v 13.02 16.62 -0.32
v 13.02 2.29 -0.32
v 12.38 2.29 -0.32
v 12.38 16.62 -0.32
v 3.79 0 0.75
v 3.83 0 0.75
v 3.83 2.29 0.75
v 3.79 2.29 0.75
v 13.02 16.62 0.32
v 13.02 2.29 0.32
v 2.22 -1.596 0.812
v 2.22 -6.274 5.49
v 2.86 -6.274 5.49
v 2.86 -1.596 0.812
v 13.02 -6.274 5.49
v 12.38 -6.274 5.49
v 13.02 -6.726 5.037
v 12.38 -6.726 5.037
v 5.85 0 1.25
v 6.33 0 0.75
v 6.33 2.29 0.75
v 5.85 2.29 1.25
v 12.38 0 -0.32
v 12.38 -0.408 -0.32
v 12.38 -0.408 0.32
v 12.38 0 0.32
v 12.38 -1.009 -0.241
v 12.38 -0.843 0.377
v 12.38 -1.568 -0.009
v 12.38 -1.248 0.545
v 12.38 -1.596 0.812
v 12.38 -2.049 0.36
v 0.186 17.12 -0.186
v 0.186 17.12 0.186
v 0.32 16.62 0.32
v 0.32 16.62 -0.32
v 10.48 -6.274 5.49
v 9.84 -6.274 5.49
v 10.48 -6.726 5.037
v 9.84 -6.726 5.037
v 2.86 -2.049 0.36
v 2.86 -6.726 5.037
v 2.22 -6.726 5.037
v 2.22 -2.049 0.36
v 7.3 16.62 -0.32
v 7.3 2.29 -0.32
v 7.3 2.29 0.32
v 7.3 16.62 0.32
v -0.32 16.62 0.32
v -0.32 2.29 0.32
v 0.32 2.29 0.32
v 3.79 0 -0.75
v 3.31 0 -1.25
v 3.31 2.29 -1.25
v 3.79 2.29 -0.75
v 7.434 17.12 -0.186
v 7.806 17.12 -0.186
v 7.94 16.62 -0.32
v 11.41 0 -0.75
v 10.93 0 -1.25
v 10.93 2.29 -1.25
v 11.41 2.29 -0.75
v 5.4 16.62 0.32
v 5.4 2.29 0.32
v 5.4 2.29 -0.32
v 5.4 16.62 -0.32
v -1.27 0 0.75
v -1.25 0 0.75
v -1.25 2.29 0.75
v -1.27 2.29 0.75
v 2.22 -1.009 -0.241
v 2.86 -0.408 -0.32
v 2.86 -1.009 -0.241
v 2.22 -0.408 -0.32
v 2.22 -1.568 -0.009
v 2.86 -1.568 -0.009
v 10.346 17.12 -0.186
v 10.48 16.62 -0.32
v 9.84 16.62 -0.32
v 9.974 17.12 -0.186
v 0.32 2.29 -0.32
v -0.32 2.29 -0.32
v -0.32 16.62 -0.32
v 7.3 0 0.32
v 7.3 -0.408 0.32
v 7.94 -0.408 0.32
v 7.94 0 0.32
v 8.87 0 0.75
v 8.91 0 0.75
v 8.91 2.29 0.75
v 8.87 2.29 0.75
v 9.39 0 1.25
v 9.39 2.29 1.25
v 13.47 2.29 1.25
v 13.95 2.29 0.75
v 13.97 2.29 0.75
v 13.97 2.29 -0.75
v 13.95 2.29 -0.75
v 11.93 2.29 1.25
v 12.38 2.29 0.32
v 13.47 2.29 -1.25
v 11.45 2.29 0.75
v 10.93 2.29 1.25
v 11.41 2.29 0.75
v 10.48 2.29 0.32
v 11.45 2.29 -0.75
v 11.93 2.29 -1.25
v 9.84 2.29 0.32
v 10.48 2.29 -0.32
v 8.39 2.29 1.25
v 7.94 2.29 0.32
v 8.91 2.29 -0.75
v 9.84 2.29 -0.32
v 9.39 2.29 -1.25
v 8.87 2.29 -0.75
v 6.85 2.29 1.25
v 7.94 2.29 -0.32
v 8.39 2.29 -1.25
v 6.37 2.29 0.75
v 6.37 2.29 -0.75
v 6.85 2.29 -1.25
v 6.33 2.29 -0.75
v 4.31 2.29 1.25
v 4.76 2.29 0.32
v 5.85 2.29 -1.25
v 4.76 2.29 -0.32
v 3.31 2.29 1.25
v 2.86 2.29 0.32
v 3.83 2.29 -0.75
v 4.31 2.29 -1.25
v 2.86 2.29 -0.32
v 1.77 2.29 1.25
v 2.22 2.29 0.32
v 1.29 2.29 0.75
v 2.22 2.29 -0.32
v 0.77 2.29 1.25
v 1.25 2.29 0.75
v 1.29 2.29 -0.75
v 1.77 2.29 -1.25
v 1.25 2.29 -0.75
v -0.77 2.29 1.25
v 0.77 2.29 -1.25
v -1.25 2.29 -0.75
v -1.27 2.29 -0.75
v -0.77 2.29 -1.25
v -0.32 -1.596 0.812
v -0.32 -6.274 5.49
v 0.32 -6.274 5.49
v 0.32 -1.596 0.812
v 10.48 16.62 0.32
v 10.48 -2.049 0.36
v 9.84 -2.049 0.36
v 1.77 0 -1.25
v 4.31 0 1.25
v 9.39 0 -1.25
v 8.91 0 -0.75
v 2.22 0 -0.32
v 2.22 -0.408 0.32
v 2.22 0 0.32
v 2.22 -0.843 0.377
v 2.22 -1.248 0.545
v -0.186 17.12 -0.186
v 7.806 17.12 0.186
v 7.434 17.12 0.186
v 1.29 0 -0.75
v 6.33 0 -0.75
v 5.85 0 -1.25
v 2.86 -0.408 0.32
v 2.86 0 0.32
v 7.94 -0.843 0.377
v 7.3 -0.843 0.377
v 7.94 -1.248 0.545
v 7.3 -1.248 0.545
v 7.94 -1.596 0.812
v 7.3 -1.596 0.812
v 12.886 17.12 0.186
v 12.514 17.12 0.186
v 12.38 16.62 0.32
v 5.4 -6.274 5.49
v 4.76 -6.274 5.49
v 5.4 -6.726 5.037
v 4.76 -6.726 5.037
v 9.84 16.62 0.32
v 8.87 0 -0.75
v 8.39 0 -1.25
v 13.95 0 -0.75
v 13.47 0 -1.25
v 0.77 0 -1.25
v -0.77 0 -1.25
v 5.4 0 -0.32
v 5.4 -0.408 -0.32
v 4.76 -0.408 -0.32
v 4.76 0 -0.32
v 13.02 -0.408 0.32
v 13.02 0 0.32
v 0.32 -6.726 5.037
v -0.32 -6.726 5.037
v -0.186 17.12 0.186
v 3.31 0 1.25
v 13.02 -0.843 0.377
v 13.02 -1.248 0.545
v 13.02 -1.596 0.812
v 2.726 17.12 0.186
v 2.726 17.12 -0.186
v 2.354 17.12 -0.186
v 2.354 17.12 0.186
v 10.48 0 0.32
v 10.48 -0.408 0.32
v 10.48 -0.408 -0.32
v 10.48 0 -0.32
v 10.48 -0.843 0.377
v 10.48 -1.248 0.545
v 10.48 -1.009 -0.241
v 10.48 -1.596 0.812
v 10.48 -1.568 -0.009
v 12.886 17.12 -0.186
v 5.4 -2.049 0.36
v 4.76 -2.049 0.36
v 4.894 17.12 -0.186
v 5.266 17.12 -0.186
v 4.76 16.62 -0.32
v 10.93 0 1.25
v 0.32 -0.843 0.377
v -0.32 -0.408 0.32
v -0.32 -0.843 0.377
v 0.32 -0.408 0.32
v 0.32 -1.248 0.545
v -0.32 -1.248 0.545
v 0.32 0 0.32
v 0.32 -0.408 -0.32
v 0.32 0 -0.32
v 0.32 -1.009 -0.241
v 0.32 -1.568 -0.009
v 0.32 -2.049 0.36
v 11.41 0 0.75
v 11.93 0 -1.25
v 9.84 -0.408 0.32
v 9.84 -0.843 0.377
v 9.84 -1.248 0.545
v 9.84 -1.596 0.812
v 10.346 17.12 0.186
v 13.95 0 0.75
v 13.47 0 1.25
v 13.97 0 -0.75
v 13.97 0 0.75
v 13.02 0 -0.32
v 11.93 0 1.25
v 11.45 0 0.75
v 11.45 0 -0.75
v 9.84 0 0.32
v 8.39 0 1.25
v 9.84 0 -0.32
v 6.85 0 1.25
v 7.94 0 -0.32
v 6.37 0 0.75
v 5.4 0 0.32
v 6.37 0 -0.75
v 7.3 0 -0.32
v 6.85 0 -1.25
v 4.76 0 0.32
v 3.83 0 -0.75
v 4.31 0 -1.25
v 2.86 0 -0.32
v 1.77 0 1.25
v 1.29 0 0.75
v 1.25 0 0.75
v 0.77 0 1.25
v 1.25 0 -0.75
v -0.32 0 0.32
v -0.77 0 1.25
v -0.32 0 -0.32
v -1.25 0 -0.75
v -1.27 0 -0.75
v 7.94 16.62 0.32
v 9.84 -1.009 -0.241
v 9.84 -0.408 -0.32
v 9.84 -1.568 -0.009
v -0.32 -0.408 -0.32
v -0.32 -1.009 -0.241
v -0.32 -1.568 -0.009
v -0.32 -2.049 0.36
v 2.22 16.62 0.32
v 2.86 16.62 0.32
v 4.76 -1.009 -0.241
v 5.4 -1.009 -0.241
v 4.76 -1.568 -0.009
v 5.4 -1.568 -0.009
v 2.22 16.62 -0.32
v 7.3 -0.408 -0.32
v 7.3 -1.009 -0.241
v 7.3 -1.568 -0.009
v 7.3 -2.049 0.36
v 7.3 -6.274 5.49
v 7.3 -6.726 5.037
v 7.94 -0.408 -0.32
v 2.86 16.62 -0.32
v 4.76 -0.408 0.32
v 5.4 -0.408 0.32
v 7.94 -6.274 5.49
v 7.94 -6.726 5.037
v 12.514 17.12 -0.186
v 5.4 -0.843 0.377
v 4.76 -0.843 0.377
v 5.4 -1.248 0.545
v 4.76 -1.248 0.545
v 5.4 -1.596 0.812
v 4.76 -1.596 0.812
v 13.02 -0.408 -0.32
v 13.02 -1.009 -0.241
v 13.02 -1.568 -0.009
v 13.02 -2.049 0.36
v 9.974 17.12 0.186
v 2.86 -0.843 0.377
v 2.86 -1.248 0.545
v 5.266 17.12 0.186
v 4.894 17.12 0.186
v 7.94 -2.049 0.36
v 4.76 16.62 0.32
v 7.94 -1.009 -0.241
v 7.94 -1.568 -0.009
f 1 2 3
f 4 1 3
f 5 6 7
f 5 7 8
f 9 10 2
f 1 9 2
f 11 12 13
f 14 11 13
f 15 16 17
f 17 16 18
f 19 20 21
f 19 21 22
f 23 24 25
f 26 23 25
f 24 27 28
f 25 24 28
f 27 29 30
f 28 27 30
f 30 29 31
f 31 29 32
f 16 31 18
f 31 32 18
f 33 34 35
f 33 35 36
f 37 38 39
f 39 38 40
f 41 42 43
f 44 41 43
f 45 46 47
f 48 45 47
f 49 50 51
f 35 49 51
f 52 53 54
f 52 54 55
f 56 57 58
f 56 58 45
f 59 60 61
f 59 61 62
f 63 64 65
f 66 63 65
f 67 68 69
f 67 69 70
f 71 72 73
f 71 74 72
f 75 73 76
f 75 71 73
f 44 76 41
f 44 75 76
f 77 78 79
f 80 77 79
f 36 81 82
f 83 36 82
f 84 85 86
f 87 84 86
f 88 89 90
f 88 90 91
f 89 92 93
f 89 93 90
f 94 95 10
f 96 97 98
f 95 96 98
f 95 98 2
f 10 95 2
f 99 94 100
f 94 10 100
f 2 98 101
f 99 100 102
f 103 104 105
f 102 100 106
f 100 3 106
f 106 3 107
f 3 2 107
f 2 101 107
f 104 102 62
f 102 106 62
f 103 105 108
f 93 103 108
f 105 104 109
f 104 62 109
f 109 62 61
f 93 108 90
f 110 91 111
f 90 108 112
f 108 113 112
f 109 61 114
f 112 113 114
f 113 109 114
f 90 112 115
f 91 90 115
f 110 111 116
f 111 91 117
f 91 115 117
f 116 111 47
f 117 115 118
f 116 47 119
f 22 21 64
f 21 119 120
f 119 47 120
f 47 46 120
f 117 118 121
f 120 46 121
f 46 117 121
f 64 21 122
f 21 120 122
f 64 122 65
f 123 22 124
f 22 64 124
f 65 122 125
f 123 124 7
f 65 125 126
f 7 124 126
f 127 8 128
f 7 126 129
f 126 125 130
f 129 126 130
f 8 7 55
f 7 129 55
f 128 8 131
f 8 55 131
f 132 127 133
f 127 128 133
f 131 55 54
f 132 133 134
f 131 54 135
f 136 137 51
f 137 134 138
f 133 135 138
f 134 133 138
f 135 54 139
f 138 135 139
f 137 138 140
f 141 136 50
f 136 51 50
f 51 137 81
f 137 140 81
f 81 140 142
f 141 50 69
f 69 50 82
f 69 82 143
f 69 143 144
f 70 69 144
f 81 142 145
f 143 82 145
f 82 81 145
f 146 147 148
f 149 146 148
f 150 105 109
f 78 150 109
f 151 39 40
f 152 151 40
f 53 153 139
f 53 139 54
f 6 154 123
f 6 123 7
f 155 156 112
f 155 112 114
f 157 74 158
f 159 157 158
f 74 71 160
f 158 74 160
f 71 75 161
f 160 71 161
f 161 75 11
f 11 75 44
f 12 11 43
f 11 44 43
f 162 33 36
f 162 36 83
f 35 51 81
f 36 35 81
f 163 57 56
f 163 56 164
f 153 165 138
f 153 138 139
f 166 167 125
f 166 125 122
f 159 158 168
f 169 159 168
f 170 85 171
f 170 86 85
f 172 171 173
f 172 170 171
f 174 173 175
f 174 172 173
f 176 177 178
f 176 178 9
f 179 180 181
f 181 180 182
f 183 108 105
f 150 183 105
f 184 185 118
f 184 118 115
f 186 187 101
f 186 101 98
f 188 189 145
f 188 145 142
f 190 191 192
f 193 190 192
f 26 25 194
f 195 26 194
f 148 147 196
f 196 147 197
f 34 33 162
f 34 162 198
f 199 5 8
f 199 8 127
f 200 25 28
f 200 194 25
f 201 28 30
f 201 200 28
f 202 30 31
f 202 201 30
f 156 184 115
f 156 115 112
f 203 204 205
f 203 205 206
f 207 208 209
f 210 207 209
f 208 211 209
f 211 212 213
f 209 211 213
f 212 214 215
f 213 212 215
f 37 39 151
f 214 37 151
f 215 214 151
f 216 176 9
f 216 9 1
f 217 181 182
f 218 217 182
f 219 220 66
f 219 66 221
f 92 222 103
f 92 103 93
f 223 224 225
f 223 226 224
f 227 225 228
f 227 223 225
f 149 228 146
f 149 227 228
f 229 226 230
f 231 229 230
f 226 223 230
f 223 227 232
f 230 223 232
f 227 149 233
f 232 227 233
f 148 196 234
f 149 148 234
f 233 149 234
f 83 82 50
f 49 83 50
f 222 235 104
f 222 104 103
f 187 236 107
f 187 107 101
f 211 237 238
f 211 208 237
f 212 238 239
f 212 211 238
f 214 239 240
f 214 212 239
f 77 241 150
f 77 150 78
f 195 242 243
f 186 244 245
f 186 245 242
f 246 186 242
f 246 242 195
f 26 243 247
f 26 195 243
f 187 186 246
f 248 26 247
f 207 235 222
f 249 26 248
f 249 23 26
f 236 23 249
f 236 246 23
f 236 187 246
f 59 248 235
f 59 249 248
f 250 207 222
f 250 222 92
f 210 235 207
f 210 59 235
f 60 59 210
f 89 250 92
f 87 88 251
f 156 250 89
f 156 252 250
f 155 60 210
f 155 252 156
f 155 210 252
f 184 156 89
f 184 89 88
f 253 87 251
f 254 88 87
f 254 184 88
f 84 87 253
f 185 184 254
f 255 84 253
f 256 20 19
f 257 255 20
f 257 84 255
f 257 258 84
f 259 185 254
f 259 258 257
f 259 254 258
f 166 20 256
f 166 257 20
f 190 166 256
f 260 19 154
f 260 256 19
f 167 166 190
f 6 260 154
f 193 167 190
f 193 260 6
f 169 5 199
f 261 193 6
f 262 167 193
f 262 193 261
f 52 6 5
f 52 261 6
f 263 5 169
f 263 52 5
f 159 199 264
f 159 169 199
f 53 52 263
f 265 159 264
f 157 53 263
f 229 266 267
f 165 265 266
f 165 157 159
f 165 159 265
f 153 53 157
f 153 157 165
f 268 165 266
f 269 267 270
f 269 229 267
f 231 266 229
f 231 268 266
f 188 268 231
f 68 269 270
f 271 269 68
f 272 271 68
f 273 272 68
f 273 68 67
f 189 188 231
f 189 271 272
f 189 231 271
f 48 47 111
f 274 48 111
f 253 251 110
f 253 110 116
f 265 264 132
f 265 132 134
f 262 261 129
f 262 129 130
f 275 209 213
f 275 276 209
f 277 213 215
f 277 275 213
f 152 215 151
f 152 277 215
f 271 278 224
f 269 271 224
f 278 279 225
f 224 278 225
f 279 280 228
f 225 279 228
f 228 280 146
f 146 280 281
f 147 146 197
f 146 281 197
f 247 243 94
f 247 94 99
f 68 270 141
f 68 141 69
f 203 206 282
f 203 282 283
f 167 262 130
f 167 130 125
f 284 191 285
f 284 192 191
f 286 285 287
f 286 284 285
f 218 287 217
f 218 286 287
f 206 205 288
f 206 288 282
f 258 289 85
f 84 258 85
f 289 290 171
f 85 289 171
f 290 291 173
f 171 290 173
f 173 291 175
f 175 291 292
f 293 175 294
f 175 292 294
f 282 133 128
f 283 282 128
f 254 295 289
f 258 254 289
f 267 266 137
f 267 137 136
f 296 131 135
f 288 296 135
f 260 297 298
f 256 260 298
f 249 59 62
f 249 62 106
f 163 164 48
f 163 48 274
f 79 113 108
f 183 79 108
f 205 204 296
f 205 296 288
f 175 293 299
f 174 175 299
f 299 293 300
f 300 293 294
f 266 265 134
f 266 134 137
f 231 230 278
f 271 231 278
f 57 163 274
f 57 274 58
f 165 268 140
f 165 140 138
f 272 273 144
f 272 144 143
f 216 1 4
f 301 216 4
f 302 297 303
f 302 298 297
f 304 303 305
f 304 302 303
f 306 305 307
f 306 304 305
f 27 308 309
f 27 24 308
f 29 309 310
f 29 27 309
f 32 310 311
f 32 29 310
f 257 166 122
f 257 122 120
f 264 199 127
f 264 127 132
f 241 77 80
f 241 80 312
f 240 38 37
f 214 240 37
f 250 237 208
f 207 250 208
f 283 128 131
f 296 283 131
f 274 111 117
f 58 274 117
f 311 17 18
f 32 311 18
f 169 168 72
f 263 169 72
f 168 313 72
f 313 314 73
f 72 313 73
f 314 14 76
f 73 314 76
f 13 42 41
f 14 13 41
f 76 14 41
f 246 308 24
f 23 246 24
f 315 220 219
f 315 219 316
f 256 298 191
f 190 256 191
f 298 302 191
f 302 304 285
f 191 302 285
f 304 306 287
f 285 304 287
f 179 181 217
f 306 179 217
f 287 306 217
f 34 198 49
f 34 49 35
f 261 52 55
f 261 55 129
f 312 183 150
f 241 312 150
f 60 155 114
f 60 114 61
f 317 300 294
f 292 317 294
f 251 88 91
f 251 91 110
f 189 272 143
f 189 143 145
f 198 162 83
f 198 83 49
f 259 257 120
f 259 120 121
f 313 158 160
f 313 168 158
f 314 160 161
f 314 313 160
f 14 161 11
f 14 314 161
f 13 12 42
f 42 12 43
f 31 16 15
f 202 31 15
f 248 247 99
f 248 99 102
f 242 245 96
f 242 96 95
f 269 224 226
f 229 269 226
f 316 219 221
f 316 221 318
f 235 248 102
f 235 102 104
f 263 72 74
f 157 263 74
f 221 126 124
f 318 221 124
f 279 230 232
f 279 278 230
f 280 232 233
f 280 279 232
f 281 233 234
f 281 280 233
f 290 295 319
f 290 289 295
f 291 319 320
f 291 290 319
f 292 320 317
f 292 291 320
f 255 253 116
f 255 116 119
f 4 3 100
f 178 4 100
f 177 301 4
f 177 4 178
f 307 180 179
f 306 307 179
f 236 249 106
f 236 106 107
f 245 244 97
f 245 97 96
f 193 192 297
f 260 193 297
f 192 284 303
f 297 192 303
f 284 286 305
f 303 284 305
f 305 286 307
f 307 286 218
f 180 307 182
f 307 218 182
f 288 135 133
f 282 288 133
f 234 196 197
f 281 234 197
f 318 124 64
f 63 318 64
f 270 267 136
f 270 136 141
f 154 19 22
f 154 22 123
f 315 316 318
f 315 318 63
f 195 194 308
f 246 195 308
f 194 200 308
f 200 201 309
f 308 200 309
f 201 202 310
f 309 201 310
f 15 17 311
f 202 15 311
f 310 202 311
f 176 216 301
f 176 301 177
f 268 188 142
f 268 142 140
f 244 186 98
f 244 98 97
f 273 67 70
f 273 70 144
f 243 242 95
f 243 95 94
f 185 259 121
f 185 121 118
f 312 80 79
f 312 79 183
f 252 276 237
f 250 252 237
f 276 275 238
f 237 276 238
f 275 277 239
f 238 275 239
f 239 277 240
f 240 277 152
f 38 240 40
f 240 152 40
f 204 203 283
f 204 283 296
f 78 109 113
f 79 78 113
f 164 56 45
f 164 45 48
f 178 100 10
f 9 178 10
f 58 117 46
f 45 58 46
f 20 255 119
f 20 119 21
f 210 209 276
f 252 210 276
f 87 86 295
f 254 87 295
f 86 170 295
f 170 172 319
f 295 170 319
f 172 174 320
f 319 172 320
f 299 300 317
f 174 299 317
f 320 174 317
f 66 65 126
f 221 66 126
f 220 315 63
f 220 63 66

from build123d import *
from OCP.BRepFilletAPI import BRepFilletAPI_MakeChamfer

# Parameters (mm, degrees)
BOSS_EXTRUDE1_DEPTH         = 2.29
SKETCH3_W                   = 0.64
SKETCH3_H                   = 0.64
CHAMFER3_SIZE               = 0.5
CHAMFER3_SIZE2              = 0.133974596
LPATTERN1_COUNT             = 6
LPATTERN1_PITCH             = 2.54
CHAMFER3_OF_LPATTERN1_SIZE  = 0.5
CHAMFER3_OF_LPATTERN1_SIZE2 = 0.133974596


with BuildPart() as part:
    # Sketch1 → Boss-Extrude1 (new body)
    with BuildSketch(Plane(origin=(0, 0, 0), x_dir=(1, 0, 0), z_dir=(0, 1, 0))):
        Polygon((-0.77, 1.25), (0.77, 1.25), (1.25, 0.75), (1.27, 0.75), (1.27, -0.75), (1.25, -0.75), (0.77, -1.25), (-0.77, -1.25), (-1.25, -0.75), (-1.27, -0.75), (-1.27, 0.75), (-1.25, 0.75), align=None)
    boss_extrude1 = extrude(amount=BOSS_EXTRUDE1_DEPTH)

    # Sweep1: sweep along a path in Sketch2
    with BuildLine(Plane(origin=(0, 0, 0), x_dir=(0, 0, -1), z_dir=(1, 0, 0))) as sweep1_path:
        Line((0, 17.12), (0, -0.408142235))
        ThreePointArc((0, -0.408142235), (-0.152240935, -1.1735091), (-0.585786438, -1.822355798))
        Line((-0.585786438, -1.822355798), (-5.26343064, -6.5))
    # Sketch3 → Sweep1 (sweep)
    with BuildSketch(Plane(origin=(0, 17.12, 0), x_dir=(1, 0, 0), z_dir=(0, 1, 0))):
        Rectangle(SKETCH3_W, SKETCH3_H)
    sweep1 = sweep(path=sweep1_path.line)

    # Chamfer3: one chamfer whose edges measure the first distance from different faces: ONE call of the kernel's chamfer builder (chamfer() names one face for all edges)
    chamfer3_edges_1 = [part.edges().sort_by_distance(p)[0] for p in [
        (0.32, 17.12, 0),
    ]]
    chamfer3_side_1 = [part.faces().sort_by_distance(p)[0] for p in [
        (0.32, 9.705, 0),
    ]]
    chamfer3_edges_2 = [part.edges().sort_by_distance(p)[0] for p in [
        (0, 17.12, -0.32),
    ]]
    chamfer3_side_2 = [part.faces().sort_by_distance(p)[0] for p in [
        (0, 9.705, -0.32),
    ]]
    chamfer3_edges_3 = [part.edges().sort_by_distance(p)[0] for p in [
        (-0.32, 17.12, 0),
    ]]
    chamfer3_side_3 = [part.faces().sort_by_distance(p)[0] for p in [
        (-0.32, 9.705, 0),
    ]]
    chamfer3_edges_4 = [part.edges().sort_by_distance(p)[0] for p in [
        (0, 17.12, 0.32),
    ]]
    chamfer3_side_4 = [part.faces().sort_by_distance(p)[0] for p in [
        (0, 9.705, 0.32),
    ]]
    chamfer3 = BRepFilletAPI_MakeChamfer(part.part.solid().wrapped)
    for e in chamfer3_edges_1:
        chamfer3.Add(CHAMFER3_SIZE, CHAMFER3_SIZE2, e.wrapped, chamfer3_side_1[0].wrapped)  # the first distance lies on this face
    for e in chamfer3_edges_2:
        chamfer3.Add(CHAMFER3_SIZE, CHAMFER3_SIZE2, e.wrapped, chamfer3_side_2[0].wrapped)  # the first distance lies on this face
    for e in chamfer3_edges_3:
        chamfer3.Add(CHAMFER3_SIZE, CHAMFER3_SIZE2, e.wrapped, chamfer3_side_3[0].wrapped)  # the first distance lies on this face
    for e in chamfer3_edges_4:
        chamfer3.Add(CHAMFER3_SIZE, CHAMFER3_SIZE2, e.wrapped, chamfer3_side_4[0].wrapped)  # the first distance lies on this face
    add(Compound.cast(chamfer3.Shape()), mode=Mode.REPLACE)

    # LPattern1: Boss-Extrude1, Sweep1 ×6
    with Locations(*[(i * LPATTERN1_PITCH, 0, 0) for i in range(1, LPATTERN1_COUNT)]):
        add(boss_extrude1)
        add(sweep1)

    # Chamfer3 of LPattern1: one chamfer whose edges measure the first distance from different faces: ONE call of the kernel's chamfer builder (chamfer() names one face for all edges)
    chamfer3_of_lpattern1_edges_1 = [part.edges().sort_by_distance(p)[0] for p in [
        (2.86, 17.12, 0),
    ]]
    chamfer3_of_lpattern1_side_1 = [part.faces().sort_by_distance(p)[0] for p in [
        (2.86, 9.705, 0),
    ]]
    chamfer3_of_lpattern1_edges_2 = [part.edges().sort_by_distance(p)[0] for p in [
        (2.54, 17.12, -0.32),
    ]]
    chamfer3_of_lpattern1_side_2 = [part.faces().sort_by_distance(p)[0] for p in [
        (2.54, 9.705, -0.32),
    ]]
    chamfer3_of_lpattern1_edges_3 = [part.edges().sort_by_distance(p)[0] for p in [
        (2.22, 17.12, 0),
    ]]
    chamfer3_of_lpattern1_side_3 = [part.faces().sort_by_distance(p)[0] for p in [
        (2.22, 9.705, 0),
    ]]
    chamfer3_of_lpattern1_edges_4 = [part.edges().sort_by_distance(p)[0] for p in [
        (2.54, 17.12, 0.32),
    ]]
    chamfer3_of_lpattern1_side_4 = [part.faces().sort_by_distance(p)[0] for p in [
        (2.54, 9.705, 0.32),
    ]]
    chamfer3_of_lpattern1_edges_5 = [part.edges().sort_by_distance(p)[0] for p in [
        (5.4, 17.12, 0),
    ]]
    chamfer3_of_lpattern1_side_5 = [part.faces().sort_by_distance(p)[0] for p in [
        (5.4, 9.705, 0),
    ]]
    chamfer3_of_lpattern1_edges_6 = [part.edges().sort_by_distance(p)[0] for p in [
        (5.08, 17.12, -0.32),
    ]]
    chamfer3_of_lpattern1_side_6 = [part.faces().sort_by_distance(p)[0] for p in [
        (5.08, 9.705, -0.32),
    ]]
    chamfer3_of_lpattern1_edges_7 = [part.edges().sort_by_distance(p)[0] for p in [
        (4.76, 17.12, 0),
    ]]
    chamfer3_of_lpattern1_side_7 = [part.faces().sort_by_distance(p)[0] for p in [
        (4.76, 9.705, 0),
    ]]
    chamfer3_of_lpattern1_edges_8 = [part.edges().sort_by_distance(p)[0] for p in [
        (5.08, 17.12, 0.32),
    ]]
    chamfer3_of_lpattern1_side_8 = [part.faces().sort_by_distance(p)[0] for p in [
        (5.08, 9.705, 0.32),
    ]]
    chamfer3_of_lpattern1_edges_9 = [part.edges().sort_by_distance(p)[0] for p in [
        (7.94, 17.12, 0),
    ]]
    chamfer3_of_lpattern1_side_9 = [part.faces().sort_by_distance(p)[0] for p in [
        (7.94, 9.705, 0),
    ]]
    chamfer3_of_lpattern1_edges_10 = [part.edges().sort_by_distance(p)[0] for p in [
        (7.62, 17.12, -0.32),
    ]]
    chamfer3_of_lpattern1_side_10 = [part.faces().sort_by_distance(p)[0] for p in [
        (7.62, 9.705, -0.32),
    ]]
    chamfer3_of_lpattern1_edges_11 = [part.edges().sort_by_distance(p)[0] for p in [
        (7.3, 17.12, 0),
    ]]
    chamfer3_of_lpattern1_side_11 = [part.faces().sort_by_distance(p)[0] for p in [
        (7.3, 9.705, 0),
    ]]
    chamfer3_of_lpattern1_edges_12 = [part.edges().sort_by_distance(p)[0] for p in [
        (7.62, 17.12, 0.32),
    ]]
    chamfer3_of_lpattern1_side_12 = [part.faces().sort_by_distance(p)[0] for p in [
        (7.62, 9.705, 0.32),
    ]]
    chamfer3_of_lpattern1_edges_13 = [part.edges().sort_by_distance(p)[0] for p in [
        (10.48, 17.12, 0),
    ]]
    chamfer3_of_lpattern1_side_13 = [part.faces().sort_by_distance(p)[0] for p in [
        (10.48, 9.705, 0),
    ]]
    chamfer3_of_lpattern1_edges_14 = [part.edges().sort_by_distance(p)[0] for p in [
        (10.16, 17.12, -0.32),
    ]]
    chamfer3_of_lpattern1_side_14 = [part.faces().sort_by_distance(p)[0] for p in [
        (10.16, 9.705, -0.32),
    ]]
    chamfer3_of_lpattern1_edges_15 = [part.edges().sort_by_distance(p)[0] for p in [
        (9.84, 17.12, 0),
    ]]
    chamfer3_of_lpattern1_side_15 = [part.faces().sort_by_distance(p)[0] for p in [
        (9.84, 9.705, 0),
    ]]
    chamfer3_of_lpattern1_edges_16 = [part.edges().sort_by_distance(p)[0] for p in [
        (10.16, 17.12, 0.32),
    ]]
    chamfer3_of_lpattern1_side_16 = [part.faces().sort_by_distance(p)[0] for p in [
        (10.16, 9.705, 0.32),
    ]]
    chamfer3_of_lpattern1_edges_17 = [part.edges().sort_by_distance(p)[0] for p in [
        (13.02, 17.12, 0),
    ]]
    chamfer3_of_lpattern1_side_17 = [part.faces().sort_by_distance(p)[0] for p in [
        (13.02, 9.705, 0),
    ]]
    chamfer3_of_lpattern1_edges_18 = [part.edges().sort_by_distance(p)[0] for p in [
        (12.7, 17.12, -0.32),
    ]]
    chamfer3_of_lpattern1_side_18 = [part.faces().sort_by_distance(p)[0] for p in [
        (12.7, 9.705, -0.32),
    ]]
    chamfer3_of_lpattern1_edges_19 = [part.edges().sort_by_distance(p)[0] for p in [
        (12.38, 17.12, 0),
    ]]
    chamfer3_of_lpattern1_side_19 = [part.faces().sort_by_distance(p)[0] for p in [
        (12.38, 9.705, 0),
    ]]
    chamfer3_of_lpattern1_edges_20 = [part.edges().sort_by_distance(p)[0] for p in [
        (12.7, 17.12, 0.32),
    ]]
    chamfer3_of_lpattern1_side_20 = [part.faces().sort_by_distance(p)[0] for p in [
        (12.7, 9.705, 0.32),
    ]]
    chamfer3_of_lpattern1 = BRepFilletAPI_MakeChamfer(part.part.solid().wrapped)
    for e in chamfer3_of_lpattern1_edges_1:
        chamfer3_of_lpattern1.Add(CHAMFER3_OF_LPATTERN1_SIZE, CHAMFER3_OF_LPATTERN1_SIZE2, e.wrapped, chamfer3_of_lpattern1_side_1[0].wrapped)  # the first distance lies on this face
    for e in chamfer3_of_lpattern1_edges_2:
        chamfer3_of_lpattern1.Add(CHAMFER3_OF_LPATTERN1_SIZE, CHAMFER3_OF_LPATTERN1_SIZE2, e.wrapped, chamfer3_of_lpattern1_side_2[0].wrapped)  # the first distance lies on this face
    for e in chamfer3_of_lpattern1_edges_3:
        chamfer3_of_lpattern1.Add(CHAMFER3_OF_LPATTERN1_SIZE, CHAMFER3_OF_LPATTERN1_SIZE2, e.wrapped, chamfer3_of_lpattern1_side_3[0].wrapped)  # the first distance lies on this face
    for e in chamfer3_of_lpattern1_edges_4:
        chamfer3_of_lpattern1.Add(CHAMFER3_OF_LPATTERN1_SIZE, CHAMFER3_OF_LPATTERN1_SIZE2, e.wrapped, chamfer3_of_lpattern1_side_4[0].wrapped)  # the first distance lies on this face
    for e in chamfer3_of_lpattern1_edges_5:
        chamfer3_of_lpattern1.Add(CHAMFER3_OF_LPATTERN1_SIZE, CHAMFER3_OF_LPATTERN1_SIZE2, e.wrapped, chamfer3_of_lpattern1_side_5[0].wrapped)  # the first distance lies on this face
    for e in chamfer3_of_lpattern1_edges_6:
        chamfer3_of_lpattern1.Add(CHAMFER3_OF_LPATTERN1_SIZE, CHAMFER3_OF_LPATTERN1_SIZE2, e.wrapped, chamfer3_of_lpattern1_side_6[0].wrapped)  # the first distance lies on this face
    for e in chamfer3_of_lpattern1_edges_7:
        chamfer3_of_lpattern1.Add(CHAMFER3_OF_LPATTERN1_SIZE, CHAMFER3_OF_LPATTERN1_SIZE2, e.wrapped, chamfer3_of_lpattern1_side_7[0].wrapped)  # the first distance lies on this face
    for e in chamfer3_of_lpattern1_edges_8:
        chamfer3_of_lpattern1.Add(CHAMFER3_OF_LPATTERN1_SIZE, CHAMFER3_OF_LPATTERN1_SIZE2, e.wrapped, chamfer3_of_lpattern1_side_8[0].wrapped)  # the first distance lies on this face
    for e in chamfer3_of_lpattern1_edges_9:
        chamfer3_of_lpattern1.Add(CHAMFER3_OF_LPATTERN1_SIZE, CHAMFER3_OF_LPATTERN1_SIZE2, e.wrapped, chamfer3_of_lpattern1_side_9[0].wrapped)  # the first distance lies on this face
    for e in chamfer3_of_lpattern1_edges_10:
        chamfer3_of_lpattern1.Add(CHAMFER3_OF_LPATTERN1_SIZE, CHAMFER3_OF_LPATTERN1_SIZE2, e.wrapped, chamfer3_of_lpattern1_side_10[0].wrapped)  # the first distance lies on this face
    for e in chamfer3_of_lpattern1_edges_11:
        chamfer3_of_lpattern1.Add(CHAMFER3_OF_LPATTERN1_SIZE, CHAMFER3_OF_LPATTERN1_SIZE2, e.wrapped, chamfer3_of_lpattern1_side_11[0].wrapped)  # the first distance lies on this face
    for e in chamfer3_of_lpattern1_edges_12:
        chamfer3_of_lpattern1.Add(CHAMFER3_OF_LPATTERN1_SIZE, CHAMFER3_OF_LPATTERN1_SIZE2, e.wrapped, chamfer3_of_lpattern1_side_12[0].wrapped)  # the first distance lies on this face
    for e in chamfer3_of_lpattern1_edges_13:
        chamfer3_of_lpattern1.Add(CHAMFER3_OF_LPATTERN1_SIZE, CHAMFER3_OF_LPATTERN1_SIZE2, e.wrapped, chamfer3_of_lpattern1_side_13[0].wrapped)  # the first distance lies on this face
    for e in chamfer3_of_lpattern1_edges_14:
        chamfer3_of_lpattern1.Add(CHAMFER3_OF_LPATTERN1_SIZE, CHAMFER3_OF_LPATTERN1_SIZE2, e.wrapped, chamfer3_of_lpattern1_side_14[0].wrapped)  # the first distance lies on this face
    for e in chamfer3_of_lpattern1_edges_15:
        chamfer3_of_lpattern1.Add(CHAMFER3_OF_LPATTERN1_SIZE, CHAMFER3_OF_LPATTERN1_SIZE2, e.wrapped, chamfer3_of_lpattern1_side_15[0].wrapped)  # the first distance lies on this face
    for e in chamfer3_of_lpattern1_edges_16:
        chamfer3_of_lpattern1.Add(CHAMFER3_OF_LPATTERN1_SIZE, CHAMFER3_OF_LPATTERN1_SIZE2, e.wrapped, chamfer3_of_lpattern1_side_16[0].wrapped)  # the first distance lies on this face
    for e in chamfer3_of_lpattern1_edges_17:
        chamfer3_of_lpattern1.Add(CHAMFER3_OF_LPATTERN1_SIZE, CHAMFER3_OF_LPATTERN1_SIZE2, e.wrapped, chamfer3_of_lpattern1_side_17[0].wrapped)  # the first distance lies on this face
    for e in chamfer3_of_lpattern1_edges_18:
        chamfer3_of_lpattern1.Add(CHAMFER3_OF_LPATTERN1_SIZE, CHAMFER3_OF_LPATTERN1_SIZE2, e.wrapped, chamfer3_of_lpattern1_side_18[0].wrapped)  # the first distance lies on this face
    for e in chamfer3_of_lpattern1_edges_19:
        chamfer3_of_lpattern1.Add(CHAMFER3_OF_LPATTERN1_SIZE, CHAMFER3_OF_LPATTERN1_SIZE2, e.wrapped, chamfer3_of_lpattern1_side_19[0].wrapped)  # the first distance lies on this face
    for e in chamfer3_of_lpattern1_edges_20:
        chamfer3_of_lpattern1.Add(CHAMFER3_OF_LPATTERN1_SIZE, CHAMFER3_OF_LPATTERN1_SIZE2, e.wrapped, chamfer3_of_lpattern1_side_20[0].wrapped)  # the first distance lies on this face
    add(Compound.cast(chamfer3_of_lpattern1.Shape()), mode=Mode.REPLACE)


solid = part.part
